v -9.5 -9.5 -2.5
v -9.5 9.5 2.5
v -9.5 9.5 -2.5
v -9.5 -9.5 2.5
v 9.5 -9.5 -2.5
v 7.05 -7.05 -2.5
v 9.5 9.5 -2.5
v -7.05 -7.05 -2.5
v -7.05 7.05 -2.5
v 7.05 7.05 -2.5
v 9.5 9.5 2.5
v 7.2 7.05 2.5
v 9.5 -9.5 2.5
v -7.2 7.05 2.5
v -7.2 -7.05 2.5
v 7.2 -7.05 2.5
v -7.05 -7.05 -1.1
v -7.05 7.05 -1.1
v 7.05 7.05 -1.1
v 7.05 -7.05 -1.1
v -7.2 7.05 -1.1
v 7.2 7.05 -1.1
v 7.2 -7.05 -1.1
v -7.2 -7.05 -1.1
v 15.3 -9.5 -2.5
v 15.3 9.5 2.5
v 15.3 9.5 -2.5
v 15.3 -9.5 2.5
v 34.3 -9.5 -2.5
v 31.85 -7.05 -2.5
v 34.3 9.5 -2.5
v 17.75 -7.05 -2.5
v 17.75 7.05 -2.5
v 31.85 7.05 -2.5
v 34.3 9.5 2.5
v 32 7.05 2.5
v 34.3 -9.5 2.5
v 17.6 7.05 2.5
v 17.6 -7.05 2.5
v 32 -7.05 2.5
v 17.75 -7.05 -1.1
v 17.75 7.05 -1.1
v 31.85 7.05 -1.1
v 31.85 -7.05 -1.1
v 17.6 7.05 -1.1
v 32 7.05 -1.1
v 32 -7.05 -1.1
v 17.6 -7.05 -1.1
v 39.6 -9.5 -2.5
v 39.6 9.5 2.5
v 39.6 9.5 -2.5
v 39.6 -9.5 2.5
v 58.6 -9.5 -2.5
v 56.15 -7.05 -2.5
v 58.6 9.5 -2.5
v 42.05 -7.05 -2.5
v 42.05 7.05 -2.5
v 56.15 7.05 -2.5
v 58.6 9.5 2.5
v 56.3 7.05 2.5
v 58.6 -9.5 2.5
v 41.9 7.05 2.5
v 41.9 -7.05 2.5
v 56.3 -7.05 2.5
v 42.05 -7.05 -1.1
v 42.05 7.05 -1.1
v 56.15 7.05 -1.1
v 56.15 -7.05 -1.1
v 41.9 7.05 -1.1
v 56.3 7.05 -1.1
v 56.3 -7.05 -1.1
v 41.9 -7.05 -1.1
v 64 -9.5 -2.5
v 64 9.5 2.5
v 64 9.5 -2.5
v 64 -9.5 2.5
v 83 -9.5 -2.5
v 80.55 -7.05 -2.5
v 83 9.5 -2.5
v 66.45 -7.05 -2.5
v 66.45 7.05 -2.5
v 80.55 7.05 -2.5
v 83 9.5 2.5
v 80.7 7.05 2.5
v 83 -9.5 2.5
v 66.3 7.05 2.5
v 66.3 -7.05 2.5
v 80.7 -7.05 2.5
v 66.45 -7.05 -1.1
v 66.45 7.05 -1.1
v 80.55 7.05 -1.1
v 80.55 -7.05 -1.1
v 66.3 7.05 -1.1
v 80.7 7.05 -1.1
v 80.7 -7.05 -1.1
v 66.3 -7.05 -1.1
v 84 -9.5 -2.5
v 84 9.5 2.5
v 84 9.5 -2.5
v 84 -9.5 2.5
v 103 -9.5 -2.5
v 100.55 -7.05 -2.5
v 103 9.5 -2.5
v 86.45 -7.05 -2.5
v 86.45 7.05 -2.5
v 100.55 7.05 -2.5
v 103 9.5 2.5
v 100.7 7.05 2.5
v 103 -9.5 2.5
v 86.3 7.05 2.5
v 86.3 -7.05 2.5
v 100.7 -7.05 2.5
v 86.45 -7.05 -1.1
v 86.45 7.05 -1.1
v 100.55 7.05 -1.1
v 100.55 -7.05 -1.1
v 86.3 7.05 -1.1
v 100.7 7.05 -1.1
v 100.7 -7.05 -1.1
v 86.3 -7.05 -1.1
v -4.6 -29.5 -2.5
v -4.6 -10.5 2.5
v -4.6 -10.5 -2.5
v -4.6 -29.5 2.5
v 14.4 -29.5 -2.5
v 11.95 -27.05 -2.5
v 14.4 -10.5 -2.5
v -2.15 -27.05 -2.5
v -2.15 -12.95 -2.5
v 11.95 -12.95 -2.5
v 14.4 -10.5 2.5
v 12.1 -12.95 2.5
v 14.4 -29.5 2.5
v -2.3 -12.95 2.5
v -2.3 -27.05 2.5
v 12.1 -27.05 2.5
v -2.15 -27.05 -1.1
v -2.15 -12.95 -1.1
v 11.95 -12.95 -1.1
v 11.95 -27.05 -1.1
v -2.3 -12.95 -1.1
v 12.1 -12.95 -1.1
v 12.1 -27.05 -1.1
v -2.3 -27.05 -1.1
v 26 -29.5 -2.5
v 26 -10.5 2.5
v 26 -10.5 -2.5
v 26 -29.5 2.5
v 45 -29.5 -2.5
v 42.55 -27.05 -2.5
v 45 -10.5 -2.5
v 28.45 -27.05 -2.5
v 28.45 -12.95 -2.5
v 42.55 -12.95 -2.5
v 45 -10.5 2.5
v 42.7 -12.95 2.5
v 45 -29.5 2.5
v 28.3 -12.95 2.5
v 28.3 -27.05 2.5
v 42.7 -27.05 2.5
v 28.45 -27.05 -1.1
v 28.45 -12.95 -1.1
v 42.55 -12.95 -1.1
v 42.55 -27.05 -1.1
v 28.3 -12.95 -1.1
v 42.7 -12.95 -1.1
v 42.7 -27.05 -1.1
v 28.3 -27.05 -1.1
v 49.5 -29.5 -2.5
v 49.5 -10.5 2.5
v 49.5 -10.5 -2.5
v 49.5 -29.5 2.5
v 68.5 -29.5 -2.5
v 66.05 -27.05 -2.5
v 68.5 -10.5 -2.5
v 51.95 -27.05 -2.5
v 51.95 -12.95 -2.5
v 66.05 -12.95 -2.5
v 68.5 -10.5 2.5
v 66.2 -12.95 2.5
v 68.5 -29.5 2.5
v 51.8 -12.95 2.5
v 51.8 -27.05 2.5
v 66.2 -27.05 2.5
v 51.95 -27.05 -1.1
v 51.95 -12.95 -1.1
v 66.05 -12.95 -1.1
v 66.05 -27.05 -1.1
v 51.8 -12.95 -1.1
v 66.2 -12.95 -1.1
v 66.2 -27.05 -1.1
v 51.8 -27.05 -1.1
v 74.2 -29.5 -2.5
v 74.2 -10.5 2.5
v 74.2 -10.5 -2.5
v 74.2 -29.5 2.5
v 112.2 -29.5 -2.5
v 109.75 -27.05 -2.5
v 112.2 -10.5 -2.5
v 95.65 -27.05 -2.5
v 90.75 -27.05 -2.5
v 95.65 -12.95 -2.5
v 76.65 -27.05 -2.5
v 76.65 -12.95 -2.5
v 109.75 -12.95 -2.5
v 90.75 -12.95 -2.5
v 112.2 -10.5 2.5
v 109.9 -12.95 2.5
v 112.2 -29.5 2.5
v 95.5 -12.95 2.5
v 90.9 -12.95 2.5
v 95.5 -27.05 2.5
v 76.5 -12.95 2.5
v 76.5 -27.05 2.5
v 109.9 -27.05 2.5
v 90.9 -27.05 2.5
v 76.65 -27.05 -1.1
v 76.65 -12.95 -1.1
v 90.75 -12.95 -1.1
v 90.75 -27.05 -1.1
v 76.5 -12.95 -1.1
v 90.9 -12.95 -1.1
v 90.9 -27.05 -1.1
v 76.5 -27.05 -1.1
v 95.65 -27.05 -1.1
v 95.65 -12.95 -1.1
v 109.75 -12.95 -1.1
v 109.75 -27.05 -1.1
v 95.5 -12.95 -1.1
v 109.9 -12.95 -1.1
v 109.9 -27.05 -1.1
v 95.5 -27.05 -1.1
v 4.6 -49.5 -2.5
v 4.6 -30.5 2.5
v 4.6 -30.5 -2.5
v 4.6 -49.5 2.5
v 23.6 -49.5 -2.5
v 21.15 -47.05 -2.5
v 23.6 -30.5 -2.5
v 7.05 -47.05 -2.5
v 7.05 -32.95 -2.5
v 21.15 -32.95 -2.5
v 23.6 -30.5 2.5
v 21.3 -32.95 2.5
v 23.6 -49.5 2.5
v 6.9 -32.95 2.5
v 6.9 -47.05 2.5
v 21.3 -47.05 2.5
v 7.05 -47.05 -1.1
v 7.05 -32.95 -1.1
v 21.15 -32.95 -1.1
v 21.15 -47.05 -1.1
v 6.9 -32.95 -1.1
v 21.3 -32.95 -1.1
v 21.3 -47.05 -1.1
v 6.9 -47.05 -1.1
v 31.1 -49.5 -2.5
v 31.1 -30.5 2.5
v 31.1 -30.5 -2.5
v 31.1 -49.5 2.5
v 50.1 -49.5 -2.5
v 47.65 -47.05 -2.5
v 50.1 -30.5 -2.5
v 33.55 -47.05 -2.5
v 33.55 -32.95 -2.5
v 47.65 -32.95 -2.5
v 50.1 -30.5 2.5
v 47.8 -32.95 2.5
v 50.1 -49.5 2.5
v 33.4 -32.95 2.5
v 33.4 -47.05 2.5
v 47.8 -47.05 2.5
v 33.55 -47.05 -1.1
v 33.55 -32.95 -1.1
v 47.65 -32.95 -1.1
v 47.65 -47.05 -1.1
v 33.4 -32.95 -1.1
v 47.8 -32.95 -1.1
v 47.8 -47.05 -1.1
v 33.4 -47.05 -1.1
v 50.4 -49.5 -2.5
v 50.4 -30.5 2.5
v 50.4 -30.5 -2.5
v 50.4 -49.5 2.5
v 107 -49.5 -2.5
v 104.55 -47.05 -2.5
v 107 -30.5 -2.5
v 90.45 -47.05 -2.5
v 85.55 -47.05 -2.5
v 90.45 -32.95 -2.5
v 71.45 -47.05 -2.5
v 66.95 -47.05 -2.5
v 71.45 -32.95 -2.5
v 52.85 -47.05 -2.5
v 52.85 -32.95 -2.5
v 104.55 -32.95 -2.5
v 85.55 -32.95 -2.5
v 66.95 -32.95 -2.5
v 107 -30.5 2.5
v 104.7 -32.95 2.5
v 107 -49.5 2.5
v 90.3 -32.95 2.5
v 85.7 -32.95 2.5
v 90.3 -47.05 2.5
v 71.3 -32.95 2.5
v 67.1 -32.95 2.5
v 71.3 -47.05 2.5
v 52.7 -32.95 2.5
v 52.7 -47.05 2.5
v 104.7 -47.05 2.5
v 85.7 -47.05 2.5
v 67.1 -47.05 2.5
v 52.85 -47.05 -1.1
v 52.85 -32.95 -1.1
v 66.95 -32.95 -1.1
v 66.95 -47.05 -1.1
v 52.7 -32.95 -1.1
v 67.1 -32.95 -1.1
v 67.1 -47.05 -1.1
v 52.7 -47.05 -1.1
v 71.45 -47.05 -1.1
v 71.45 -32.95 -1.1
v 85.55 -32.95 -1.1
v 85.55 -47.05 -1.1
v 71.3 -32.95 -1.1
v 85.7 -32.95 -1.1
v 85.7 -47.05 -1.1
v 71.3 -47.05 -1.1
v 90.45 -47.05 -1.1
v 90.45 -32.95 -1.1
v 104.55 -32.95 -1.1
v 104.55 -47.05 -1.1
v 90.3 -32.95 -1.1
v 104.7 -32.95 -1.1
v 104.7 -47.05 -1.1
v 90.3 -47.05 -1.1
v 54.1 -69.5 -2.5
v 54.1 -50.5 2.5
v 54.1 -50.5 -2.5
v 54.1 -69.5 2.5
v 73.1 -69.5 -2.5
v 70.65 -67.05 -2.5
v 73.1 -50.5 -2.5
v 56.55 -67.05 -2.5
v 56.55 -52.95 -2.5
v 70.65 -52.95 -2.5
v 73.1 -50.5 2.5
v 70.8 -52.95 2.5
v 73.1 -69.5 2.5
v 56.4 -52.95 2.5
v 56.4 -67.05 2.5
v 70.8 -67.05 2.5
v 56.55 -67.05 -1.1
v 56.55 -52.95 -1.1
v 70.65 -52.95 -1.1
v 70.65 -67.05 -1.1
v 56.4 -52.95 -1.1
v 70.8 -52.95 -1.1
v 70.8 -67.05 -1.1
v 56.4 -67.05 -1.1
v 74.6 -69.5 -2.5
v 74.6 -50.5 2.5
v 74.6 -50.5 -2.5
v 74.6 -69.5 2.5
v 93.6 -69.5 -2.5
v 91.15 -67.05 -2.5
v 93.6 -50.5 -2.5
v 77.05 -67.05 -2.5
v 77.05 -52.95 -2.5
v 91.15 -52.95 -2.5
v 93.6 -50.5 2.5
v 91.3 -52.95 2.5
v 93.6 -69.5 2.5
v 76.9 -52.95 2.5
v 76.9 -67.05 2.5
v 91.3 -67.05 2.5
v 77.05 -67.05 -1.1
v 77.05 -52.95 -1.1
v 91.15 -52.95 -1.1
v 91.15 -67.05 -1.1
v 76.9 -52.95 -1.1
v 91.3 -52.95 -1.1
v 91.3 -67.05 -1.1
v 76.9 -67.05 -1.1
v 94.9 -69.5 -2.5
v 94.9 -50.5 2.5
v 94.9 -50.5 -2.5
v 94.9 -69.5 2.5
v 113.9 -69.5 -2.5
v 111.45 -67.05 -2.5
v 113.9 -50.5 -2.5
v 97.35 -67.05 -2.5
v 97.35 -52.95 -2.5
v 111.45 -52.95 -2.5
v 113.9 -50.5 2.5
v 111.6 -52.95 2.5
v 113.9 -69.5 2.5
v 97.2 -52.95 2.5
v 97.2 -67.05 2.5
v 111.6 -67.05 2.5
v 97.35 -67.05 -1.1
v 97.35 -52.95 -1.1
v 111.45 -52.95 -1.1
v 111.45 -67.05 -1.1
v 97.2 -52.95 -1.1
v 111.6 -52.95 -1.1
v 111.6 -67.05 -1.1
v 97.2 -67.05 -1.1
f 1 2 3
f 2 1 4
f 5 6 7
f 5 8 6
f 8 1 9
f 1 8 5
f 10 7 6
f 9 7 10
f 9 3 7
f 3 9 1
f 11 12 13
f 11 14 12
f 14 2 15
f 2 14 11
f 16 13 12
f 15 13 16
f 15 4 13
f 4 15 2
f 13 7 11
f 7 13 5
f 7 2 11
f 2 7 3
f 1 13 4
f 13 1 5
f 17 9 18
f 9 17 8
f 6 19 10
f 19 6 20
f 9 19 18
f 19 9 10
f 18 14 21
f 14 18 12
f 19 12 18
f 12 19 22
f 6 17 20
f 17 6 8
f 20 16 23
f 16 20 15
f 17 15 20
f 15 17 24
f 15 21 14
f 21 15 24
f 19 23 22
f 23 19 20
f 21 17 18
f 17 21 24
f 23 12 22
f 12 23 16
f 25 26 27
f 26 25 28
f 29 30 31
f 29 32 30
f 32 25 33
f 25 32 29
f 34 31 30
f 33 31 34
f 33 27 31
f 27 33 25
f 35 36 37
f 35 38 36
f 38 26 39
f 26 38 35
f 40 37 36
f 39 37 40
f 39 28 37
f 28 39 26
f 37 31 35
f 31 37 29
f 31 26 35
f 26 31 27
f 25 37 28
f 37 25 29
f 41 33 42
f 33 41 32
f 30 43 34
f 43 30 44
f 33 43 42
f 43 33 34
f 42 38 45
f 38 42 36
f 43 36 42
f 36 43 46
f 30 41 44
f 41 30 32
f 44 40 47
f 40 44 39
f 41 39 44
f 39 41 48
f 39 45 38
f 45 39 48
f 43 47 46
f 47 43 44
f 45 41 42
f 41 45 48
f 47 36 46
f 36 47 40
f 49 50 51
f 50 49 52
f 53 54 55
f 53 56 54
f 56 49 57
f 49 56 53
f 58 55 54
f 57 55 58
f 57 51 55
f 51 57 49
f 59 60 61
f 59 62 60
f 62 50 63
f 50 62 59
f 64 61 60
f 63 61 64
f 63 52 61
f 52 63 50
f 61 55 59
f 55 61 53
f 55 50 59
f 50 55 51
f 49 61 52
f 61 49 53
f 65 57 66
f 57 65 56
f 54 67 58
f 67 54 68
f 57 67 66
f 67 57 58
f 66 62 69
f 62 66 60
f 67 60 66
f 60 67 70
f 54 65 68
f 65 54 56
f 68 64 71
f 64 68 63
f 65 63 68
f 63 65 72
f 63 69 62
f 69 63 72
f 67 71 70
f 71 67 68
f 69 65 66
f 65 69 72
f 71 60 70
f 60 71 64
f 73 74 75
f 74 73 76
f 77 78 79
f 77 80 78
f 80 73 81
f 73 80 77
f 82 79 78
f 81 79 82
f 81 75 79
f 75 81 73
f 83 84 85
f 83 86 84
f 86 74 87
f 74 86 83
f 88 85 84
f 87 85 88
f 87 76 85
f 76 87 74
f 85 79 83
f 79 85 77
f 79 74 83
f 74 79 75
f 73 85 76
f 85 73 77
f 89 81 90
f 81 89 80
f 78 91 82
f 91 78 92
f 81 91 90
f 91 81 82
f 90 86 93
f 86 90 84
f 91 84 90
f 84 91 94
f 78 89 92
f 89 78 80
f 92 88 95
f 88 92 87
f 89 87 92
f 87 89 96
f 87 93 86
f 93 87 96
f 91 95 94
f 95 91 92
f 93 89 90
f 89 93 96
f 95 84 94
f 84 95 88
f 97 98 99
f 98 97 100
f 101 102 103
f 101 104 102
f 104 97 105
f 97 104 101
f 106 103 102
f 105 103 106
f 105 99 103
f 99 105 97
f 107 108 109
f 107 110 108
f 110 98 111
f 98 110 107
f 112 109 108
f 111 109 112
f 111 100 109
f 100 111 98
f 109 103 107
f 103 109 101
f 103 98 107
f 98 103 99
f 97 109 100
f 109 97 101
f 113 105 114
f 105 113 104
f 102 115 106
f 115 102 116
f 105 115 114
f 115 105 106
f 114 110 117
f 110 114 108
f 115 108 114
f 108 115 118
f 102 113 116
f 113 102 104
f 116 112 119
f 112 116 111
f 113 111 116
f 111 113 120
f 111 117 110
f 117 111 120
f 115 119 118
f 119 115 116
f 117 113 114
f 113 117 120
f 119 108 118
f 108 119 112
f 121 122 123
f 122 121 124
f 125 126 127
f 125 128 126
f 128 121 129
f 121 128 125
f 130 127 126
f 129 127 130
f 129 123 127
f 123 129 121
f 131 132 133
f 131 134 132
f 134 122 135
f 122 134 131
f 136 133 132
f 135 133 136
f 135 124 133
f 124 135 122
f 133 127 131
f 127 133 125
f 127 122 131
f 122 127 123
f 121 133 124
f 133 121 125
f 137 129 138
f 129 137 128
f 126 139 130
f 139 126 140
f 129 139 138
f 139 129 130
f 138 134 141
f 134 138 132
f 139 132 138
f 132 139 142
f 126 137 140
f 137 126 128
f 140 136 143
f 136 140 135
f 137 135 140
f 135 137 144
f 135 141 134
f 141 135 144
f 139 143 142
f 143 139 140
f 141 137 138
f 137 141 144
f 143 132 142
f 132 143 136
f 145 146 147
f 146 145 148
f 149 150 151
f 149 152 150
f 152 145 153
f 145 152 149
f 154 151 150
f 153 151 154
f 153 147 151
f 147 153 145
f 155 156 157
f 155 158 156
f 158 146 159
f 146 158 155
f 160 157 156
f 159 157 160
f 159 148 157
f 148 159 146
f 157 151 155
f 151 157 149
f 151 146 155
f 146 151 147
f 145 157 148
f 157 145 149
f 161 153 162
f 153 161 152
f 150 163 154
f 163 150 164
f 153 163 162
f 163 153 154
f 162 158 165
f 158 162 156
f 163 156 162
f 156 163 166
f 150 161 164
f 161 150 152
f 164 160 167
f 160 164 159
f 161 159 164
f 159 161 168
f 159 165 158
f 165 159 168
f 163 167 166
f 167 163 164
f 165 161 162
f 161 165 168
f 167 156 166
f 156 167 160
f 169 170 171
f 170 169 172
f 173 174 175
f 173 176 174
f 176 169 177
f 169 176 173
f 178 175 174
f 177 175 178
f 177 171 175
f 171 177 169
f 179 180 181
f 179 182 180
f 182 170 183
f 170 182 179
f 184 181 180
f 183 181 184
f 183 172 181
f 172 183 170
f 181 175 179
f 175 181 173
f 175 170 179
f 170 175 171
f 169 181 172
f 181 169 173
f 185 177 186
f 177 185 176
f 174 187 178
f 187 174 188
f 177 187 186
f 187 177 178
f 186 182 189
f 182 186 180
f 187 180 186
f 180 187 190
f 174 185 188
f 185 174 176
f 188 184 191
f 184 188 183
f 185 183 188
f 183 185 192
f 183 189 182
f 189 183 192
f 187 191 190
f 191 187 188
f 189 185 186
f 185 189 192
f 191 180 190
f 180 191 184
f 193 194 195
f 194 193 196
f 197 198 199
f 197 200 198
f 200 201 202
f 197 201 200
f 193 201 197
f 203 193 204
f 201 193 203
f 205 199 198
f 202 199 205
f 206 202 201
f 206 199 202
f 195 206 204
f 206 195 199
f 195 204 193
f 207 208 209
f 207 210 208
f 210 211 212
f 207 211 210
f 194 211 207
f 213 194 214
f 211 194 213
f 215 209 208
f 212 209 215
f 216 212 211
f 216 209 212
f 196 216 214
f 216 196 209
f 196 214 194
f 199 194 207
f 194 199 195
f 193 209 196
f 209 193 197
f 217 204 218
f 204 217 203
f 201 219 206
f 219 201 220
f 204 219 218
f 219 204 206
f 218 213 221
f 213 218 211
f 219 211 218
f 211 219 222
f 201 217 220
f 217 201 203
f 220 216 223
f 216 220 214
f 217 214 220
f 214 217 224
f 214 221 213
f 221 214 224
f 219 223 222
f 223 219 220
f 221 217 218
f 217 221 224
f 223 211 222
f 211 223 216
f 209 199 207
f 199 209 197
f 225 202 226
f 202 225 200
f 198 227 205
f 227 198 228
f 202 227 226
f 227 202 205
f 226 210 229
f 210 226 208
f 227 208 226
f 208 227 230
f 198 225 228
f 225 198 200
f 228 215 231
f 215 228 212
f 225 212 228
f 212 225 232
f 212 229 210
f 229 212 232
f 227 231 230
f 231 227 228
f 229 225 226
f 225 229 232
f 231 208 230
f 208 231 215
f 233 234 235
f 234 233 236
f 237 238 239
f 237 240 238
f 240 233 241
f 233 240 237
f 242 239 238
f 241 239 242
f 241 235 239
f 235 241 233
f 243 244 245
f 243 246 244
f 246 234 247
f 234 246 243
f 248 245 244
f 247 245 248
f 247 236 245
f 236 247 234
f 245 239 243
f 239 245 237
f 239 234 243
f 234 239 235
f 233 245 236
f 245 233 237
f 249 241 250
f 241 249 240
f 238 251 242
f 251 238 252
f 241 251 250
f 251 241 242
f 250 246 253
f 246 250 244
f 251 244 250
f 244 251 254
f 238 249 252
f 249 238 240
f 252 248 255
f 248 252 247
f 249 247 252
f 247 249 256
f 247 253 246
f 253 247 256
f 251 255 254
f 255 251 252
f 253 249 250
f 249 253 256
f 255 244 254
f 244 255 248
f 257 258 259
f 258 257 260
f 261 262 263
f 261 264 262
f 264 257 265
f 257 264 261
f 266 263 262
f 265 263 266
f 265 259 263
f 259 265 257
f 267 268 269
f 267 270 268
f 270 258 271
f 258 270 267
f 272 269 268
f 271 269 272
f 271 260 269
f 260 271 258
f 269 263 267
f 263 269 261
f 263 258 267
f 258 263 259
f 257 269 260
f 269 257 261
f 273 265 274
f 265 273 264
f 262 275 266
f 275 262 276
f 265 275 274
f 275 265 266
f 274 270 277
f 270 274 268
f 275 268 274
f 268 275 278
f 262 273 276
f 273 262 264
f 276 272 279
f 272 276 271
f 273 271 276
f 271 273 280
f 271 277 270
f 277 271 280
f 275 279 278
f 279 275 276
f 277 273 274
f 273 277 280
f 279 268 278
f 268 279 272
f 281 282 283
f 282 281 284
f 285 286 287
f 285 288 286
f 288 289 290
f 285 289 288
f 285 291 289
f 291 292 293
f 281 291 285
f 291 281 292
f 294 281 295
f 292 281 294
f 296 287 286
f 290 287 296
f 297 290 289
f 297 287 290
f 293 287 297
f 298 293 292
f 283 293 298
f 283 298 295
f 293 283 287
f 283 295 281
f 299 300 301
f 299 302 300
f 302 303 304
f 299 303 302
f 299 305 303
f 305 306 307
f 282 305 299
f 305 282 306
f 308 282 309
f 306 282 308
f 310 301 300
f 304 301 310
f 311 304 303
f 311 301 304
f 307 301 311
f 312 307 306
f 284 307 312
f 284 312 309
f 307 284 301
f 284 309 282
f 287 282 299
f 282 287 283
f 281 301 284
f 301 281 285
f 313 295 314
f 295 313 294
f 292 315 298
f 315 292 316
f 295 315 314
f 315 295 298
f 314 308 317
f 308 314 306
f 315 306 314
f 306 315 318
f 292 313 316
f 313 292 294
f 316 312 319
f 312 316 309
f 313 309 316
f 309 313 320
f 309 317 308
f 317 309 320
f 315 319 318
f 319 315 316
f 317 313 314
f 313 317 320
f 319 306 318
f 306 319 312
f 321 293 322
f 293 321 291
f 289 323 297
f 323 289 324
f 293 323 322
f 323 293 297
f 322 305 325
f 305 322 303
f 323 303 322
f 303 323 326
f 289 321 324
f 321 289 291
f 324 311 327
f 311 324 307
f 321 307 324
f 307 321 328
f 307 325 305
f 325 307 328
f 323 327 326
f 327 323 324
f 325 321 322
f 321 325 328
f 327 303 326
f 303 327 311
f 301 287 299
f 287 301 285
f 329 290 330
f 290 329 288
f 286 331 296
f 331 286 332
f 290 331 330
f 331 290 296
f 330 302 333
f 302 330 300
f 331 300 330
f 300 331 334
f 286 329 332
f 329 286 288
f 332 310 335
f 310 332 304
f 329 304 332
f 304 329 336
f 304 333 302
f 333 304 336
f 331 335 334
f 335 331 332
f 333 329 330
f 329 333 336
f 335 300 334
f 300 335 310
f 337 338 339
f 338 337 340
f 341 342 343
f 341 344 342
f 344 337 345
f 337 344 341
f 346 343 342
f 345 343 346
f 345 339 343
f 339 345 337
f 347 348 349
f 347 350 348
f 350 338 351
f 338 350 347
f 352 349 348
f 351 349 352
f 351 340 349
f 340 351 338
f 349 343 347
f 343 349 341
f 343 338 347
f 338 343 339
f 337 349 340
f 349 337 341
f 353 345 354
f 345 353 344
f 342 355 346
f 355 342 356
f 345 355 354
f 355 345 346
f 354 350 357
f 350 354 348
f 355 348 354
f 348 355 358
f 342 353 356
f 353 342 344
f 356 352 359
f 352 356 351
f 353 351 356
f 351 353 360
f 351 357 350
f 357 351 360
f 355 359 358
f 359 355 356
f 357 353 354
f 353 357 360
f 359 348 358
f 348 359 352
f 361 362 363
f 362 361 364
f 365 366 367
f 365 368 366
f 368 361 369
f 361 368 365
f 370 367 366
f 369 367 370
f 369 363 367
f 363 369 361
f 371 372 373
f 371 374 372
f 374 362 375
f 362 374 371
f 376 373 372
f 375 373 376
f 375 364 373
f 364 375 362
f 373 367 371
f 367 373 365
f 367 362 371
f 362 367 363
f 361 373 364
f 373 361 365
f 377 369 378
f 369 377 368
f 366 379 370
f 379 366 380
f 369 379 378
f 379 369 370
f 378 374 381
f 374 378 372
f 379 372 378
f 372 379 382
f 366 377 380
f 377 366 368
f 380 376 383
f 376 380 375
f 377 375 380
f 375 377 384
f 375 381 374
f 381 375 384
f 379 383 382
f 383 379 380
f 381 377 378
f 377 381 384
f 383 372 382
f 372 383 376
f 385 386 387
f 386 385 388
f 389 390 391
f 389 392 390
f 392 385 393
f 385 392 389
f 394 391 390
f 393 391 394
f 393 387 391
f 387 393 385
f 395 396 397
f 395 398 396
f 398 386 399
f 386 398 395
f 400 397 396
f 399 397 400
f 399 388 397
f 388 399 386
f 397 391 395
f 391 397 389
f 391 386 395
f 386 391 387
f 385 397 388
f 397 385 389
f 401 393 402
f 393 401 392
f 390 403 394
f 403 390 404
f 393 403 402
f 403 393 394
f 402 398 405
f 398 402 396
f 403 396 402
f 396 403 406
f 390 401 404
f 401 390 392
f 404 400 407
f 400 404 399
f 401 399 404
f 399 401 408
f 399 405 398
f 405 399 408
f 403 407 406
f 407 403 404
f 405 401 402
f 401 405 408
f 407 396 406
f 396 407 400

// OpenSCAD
/*
##### Vial
Copy Vial Firmware vial.uf2 to PR2040
Config met vial configurator https://vial.rocks/

#### common layout
Left thumb Ctrl Alt Shift
Right thumb Enter Space Tab(?)
lower prio ,./ 


#### Special tricks
double press two keybords e.g. 
	momentary layer double thumb pres
	single shot layer double thumb pres

Special keys
print screen
Tab	
Del Left Thumb cluster with Backspace subst ;
Backspace -> subst ;

### Ctrl
Ctrl+c
Ctrl+x
Ctrl+v

Solution
tabdance
momentary layer
NO Double Thumb one hand on mouse no double press action two keybaords

### Navigation/quick edit
Del Left Thumb cluster with Backspace subst ;
Arrows
Pgup
PgDn
home 
end
copy 
cut 
paste
Select extend Ctrl+Shift+Arrows
Select end of line

Solution


Windows management
Move window screen Win+shift+Left-Right Default
max window Ctrl+Alt+Up AHK
min window
close window

#### Ctrl+Alt
Quick launch

Ctrl+Alt+Q-P 

Solution
Ctrl-Alt-Shift left -> thunb conbo
tabdance to stick Ctrl+Al

### Layers
Order of importance so easy to use

## 1 Fast edit Left thumb
# right pad
Arrows 
Page up down
_ underscore 

# left pad
cut a
copy f
paste d


## 2 Num thumb double tab hold

## 3 Function

## 4 shortcuts launches on shot 
CTRL ALT #




























##### hardware soldering
https://scottokeebs.com/blogs/keyboards/scottoergo-handwired-keyboard

	1  "GP0"        40
	2  "GP1"        39
	3               38
	4  "GP2"        37
	5  "GP3"        36
	6  "GP4"        35
	7               34
	8               33
	9               32
	10              31
	11              30
	12              29"GP22"
	13              28
	14              27"GP21"
	15              26"GP20"
	16 "GP12"r      25"GP19"
	17 "GP13"r      24"GP18"
	18              23 
	19 "GP14"r      22
	20 "GP15"r      21

constFilePath=C:\user\job\data\setting\openscad\easy_dactyl\easyDactyl.scad
Autohotkey plugin
strOffset=2
*/

/*
https://openscad.org/cheatsheet/
Todo

Make thumb cluster

thumb inner down
Thum mid slightly out
Thum outer slightly in

clamp bottom top
connect top rows

*/
$fn=64;
hook_w = 3.5;
hook_t = 1.5;
hook_h = 10;

beak_l = 1; // overhang
beak_h = 2;
beak_w = hook_w;

stem_b = hook_w; // overhang
stem_h = hook_h;
stem_t = hook_t;

/*
12 pins
battery=3
*/
draad_dia=2;

//pro micro controler
pm_pin_w = 15.24;
pm_w = 18;
pm_l = 33;
pm_h = 3.2; //solder included
//pm_l = 9;

pin_dist=2.54;
//Header Sandwitch
hs_plate_h = 6;
hs_plate_w = pm_w+6;
hs_plate_l = pm_l;
hs_shift_back=hs_plate_l/2;
// hs_shift_lower=(hs_plate_h/2);
hs_shift_lower=3;
// Reinforcement strips on top of the sides
//reinforcement_strip_h=2;
dropSideWireHole=1.5; // height to to center wire pierce
// cut top and bottom
cutPlate_w = 30;
cutPlate_l = 40;
cutPlate_h = 20;
// battery compartment
//bc_h = hs_plate_h+4;
//bc_w = hs_plate_w-11;
bc_l = hs_plate_l+2;
bed_h                 = 1;
bc_h                  = 3.5;
//bc_h                  = 7;
bc_w                  = 13;
pin_supp_h            = 1.5;
reinforcement_strip_h = 2 ;

//#hs_top();
module hs_top()
{
    difference()
    {
        header_body();
        translate([0, 0, bed_h + bc_h + -(cutPlate_h/2)]){cube([cutPlate_l, cutPlate_w, cutPlate_h], true);}
    }
}

//hs_bottom();
module hs_bottom()
{

// Hooks
/*
    #translate([5.2, -(hook_t/2)-(hs_plate_w/2), hook_h/2])rotate([0, 0, 90]){hook();}
    #translate([5.2, (hook_t/2)+(hs_plate_w/2), hook_h/2])rotate([0, 0, -90]){hook();}
    #translate([-14.75, -(hook_t/2)-(hs_plate_w/2), hook_h/2])rotate([0, 0, 90]){hook();}
    #translate([-14.75, (hook_t/2)+(hs_plate_w/2), hook_h/2])rotate([0, 0, -90]){hook();}
*/

    //stopper corner plates
    // sp_t = 1.2;
    // sp_w = (hs_plate_w-bc_w)/2;
    // sp_h = 6;
    // translate([-sp_t/2-hs_plate_l/2,   hs_plate_w/2-sp_w/2 , sp_h/2]){cube([sp_t, sp_w, sp_h], true);}
    // translate([-sp_t/2-hs_plate_l/2, -(hs_plate_w/2-sp_w/2), sp_h/2]){cube([sp_t, sp_w, sp_h], true);}
    // translate([ sp_t/2+hs_plate_l/2, -(hs_plate_w/2-sp_w/2), sp_h/2]){cube([sp_t, sp_w, sp_h], true);}
    // translate([ sp_t/2+hs_plate_l/2,   hs_plate_w/2-sp_w/2 , sp_h/2]){cube([sp_t, sp_w, sp_h], true);}

    difference()
    {
        header_body();
        translate([0, 0, bed_h + bc_h + (cutPlate_h/2)]){cube([cutPlate_l, cutPlate_w, cutPlate_h], true);}
    }
}

//Hood
hood_t = 1.8;
hood_h = hood_t + bed_h + bc_h + pin_supp_h + reinforcement_strip_h+ pm_h;
hood_w = hs_plate_w + hood_t*2;
hood_l = hs_plate_l;
//hs_plate_h = bed_h + bc_h + pin_supp_h + reinforcement_strip_h;
beak_bottom_l = 6;
beak_bottom_w = hs_plate_l;
beak_bottom_h = 1.8;
beak_bottom_angle = 25;

// rotate([180, 90, 0]){hood();}
module hood()
{
    difference()
    {
        hood_raw();
        translate([0, 0, (hood_h / 2)                                          ]){cube([hood_l, hood_w - hood_t*2, hood_h - hood_t -1], true);} // inner hood removeal
        sideCableOpeningPierce();
        translate([0, 0, -2+(hood_h / 2)                                          ]){cube([hood_l, -4+hood_w - hood_t*2, hood_h -hood_t], true);} // inner hood removeal
    }
}

module hood_raw()
{
    translate([0, 0, (hood_h / 2)                                          ]){cube([hood_l, hood_w, hood_h], true);}
    hoodBottomBeak();
}

module hoodBottomBeak() //clamp bottom hood
{
    translate([0, -hood_w/2, -beak_bottom_h]){rotate([180, 0, 90]){hook_head(beak_bottom_l, beak_bottom_w, beak_bottom_h, beak_bottom_angle);}}
    translate([0, hood_w/2, -beak_bottom_h]){rotate([180, 0, -90]){hook_head(beak_bottom_l, beak_bottom_w, beak_bottom_h, beak_bottom_angle);}}
}

module sideCableOpeningPierce() //opening all cable outlet
{
    hood_cable_opening_h = beak_bottom_h+bed_h + bc_h + pin_supp_h + reinforcement_strip_h;
    hood_cable_opening_w = 10;
    hood_cable_opening_l = 14;
    moveToSide=(-hood_w/2)-(hood_cable_opening_w/2) + hood_t+2;
    moveToOverCable = -5;
    translate([moveToOverCable, moveToSide, -beak_bottom_h + hood_cable_opening_h/2]){cube([hood_cable_opening_l, hood_cable_opening_w, hood_cable_opening_h], true);}
}

// header_body();
module header_body()
{
    hs_plate_h = bed_h + bc_h + pin_supp_h + reinforcement_strip_h;

    difference()
    {
        translate([0, 0, hs_plate_h / 2                                         ]){cube([hs_plate_l, hs_plate_w, hs_plate_h], true);}
        translate([0, 0, (reinforcement_strip_h / 2) + bed_h + pin_supp_h + bc_h]){cube([hs_plate_l+1, pm_w, reinforcement_strip_h], true);}
        translate([0, 0, (bc_h/2) + bed_h                                       ]){cube([bc_l, bc_w, bc_h], true);}
        holes_top_pierce = 5; //size cube heigth pushing square holes top
        translate([-5, 0, bc_h + bed_h + holes_top_pierce/2                    ]){cube([17, bc_w, holes_top_pierce], true);}
        translate([12, 0, bc_h + bed_h + holes_top_pierce/2                     ]){cube([10, bc_w, holes_top_pierce], true);}
        StartOffset=14;
        translate([-StartOffset, 0, bed_h + bc_h]){
            translate([pin_dist*0 , 0, 0]){pin_pair(0, 0);}
            translate([pin_dist*1 , 0, 0]){pin_pair(0, 0);}
            translate([pin_dist*2 , 0, 0]){pin_pair(1, 1);}
            translate([pin_dist*3 , 0, 0]){pin_pair(1, 1);}
            translate([pin_dist*4 , 0, 0]){pin_pair(1, 1);}
            translate([pin_dist*5 , 0, 0]){pin_pair(1, 1);} // row 1
            translate([pin_dist*6 , 0, 0]){pin_pair(0, 1);} //        col 1
            translate([pin_dist*7 , 0, 0]){pin_pair(0, 0);}
            translate([pin_dist*8 , 0, 0]){pin_pair(0, 0);}
            translate([pin_dist*9 , 0, 0]){pin_pair(0, 1);} // -
            translate([pin_dist*10, 0, 0]){pin_pair(0, 0);}
            translate([pin_dist*11, 0, 0]){pin_pair(0, 1);} // +
            // row side wire col pass through in between
            translate([pin_dist*6  + (pin_dist/2), 0, 0]){pin_side_row_pass();}
            translate([pin_dist*7  + (pin_dist/2), 0, 0]){pin_side_row_pass();}
            translate([pin_dist*8  + (pin_dist/2), 0, 0]){pin_side_row_pass();}
            translate([pin_dist*9  + (pin_dist/2), 0, 0]){pin_side_row_pass();}
            translate([pin_dist*10 + (pin_dist/2), 0, 0]){pin_side_row_pass();}
        }
        //ColWireCut();
    }
}

// wire cut transport hole row side wide opening replace by routing inbetween pins
module ColWireCut()
{
    wireHole=6;
    wireHolePierce=hs_plate_w/2;
    
    translate([-5, -12, 1]){rotate([90, 0, 0]){cylinder(wireHolePierce, wireHole/2, wireHole/2,true);}}
}

//Totaal
//translate([0, 0, 3]){header_sandwitch();}
module header_sandwitch()
{
    // reinforcement top row holes
    difference()
    {
        translate([hs_shift_back, 0, (hs_plate_h/2)+(reinforcement_strip_h/2)]){cube([hs_plate_l, hs_plate_w, reinforcement_strip_h], true);}
        translate([hs_shift_back, 0, (hs_plate_h/2)+(reinforcement_strip_h/2)]){cube([pm_l+0.5, pm_w+0.5, reinforcement_strip_h+0.5], true);}
    }

    difference()
    {
        //lower body

        translate([hs_shift_back, 0, 0]){cube([hs_plate_l, hs_plate_w, hs_plate_h], true);}
        //cube([hs_plate_l, hs_plate_w, hs_plate_h], true);
        StartOffset=1.5;
        fromTop=(hs_plate_h/2)-dropSideWireHole; // height to center wire pierce so will lower side wire hole descreases pier from mc

        translate([StartOffset, 0, fromTop]){
            translate([pin_dist*0 , 0, 0]){pin_pair(0, 0);}
            translate([pin_dist*1 , 0, 0]){pin_pair(0, 0);}
            translate([pin_dist*2 , 0, 0]){pin_pair(1, 1);}
            translate([pin_dist*3 , 0, 0]){pin_pair(1, 1);}
            translate([pin_dist*4 , 0, 0]){pin_pair(1, 1);}
            translate([pin_dist*5 , 0, 0]){pin_pair(1, 1);} // row 1
            translate([pin_dist*6 , 0, 0]){pin_pair(0, 1);} //        col 1
            translate([pin_dist*7 , 0, 0]){pin_pair(0, 0);}
            translate([pin_dist*8 , 0, 0]){pin_pair(0, 0);}
            translate([pin_dist*9 , 0, 0]){pin_pair(0, 1);} // -
            translate([pin_dist*10, 0, 0]){pin_pair(0, 0);}
            translate([pin_dist*11, 0, 0]){pin_pair(0, 1);} // +
        }

        // battery compartment
        translate([hs_shift_back, 0, hs_shift_lower]){cube([bc_l, bc_w, bc_h], true);}
    }
}

module pin_pair( wire_pierce_row, wire_pierce_col)
{
    pin_side_col(wire_pierce_col);
    pin_side_row(wire_pierce_row);
}

module pin_side_col(wire_pierce_col)
{
    translate([0, pm_pin_w/2, 0])
    {
        pin_pierce();
        if (wire_pierce_col)
            wire_pierce(10);
        else
            wire_pierce(1.8);
    }
}

module pin_side_row(wire_pierce_row)
{
    translate([0, -pm_pin_w/2, 0])
    {
        pin_pierce();
        if (wire_pierce_row)
            wire_pierce(10);
        else
            wire_pierce(1.8);
    }
}

module pin_side_row_pass()
{
    translate([0, -pm_pin_w/2, 0])
    {
        wire_pierce(10);
    }
}

module pin_pierce()
{
    //pin pierce
    pin_dia=1.2;
    pin_l=2.8*10;
    cylinder(pin_l, pin_dia/2, pin_dia/2,true);
}

module wire_pierce(w_pierce)
{
    //Wire pierce is length all the way through is 10 only use for easy pin through no clean up 3
    // w_pierce=10;
    rotate([90, 0, 0]){cylinder(w_pierce, draad_dia/2, draad_dia/2,true);}
}

/*
https://www.blocklayer.com/graph-papereng
Put key caps with gum for layout
puncture center of of caps 
measure Y and X in 
Raw grid for https://www.keyboard-layout-editor.com/#/

[{y:0.13,x:5},"R"],
[{y:-0.5,x:10.25},"U"],
[{y:-0.88,x:3.75},"E"],
[{y:-0.87,x:2.5},"W"],
[{y:-0.88,x:11.5},"I"],
[{y:-0.87,x:12.75},"O"],
[{y:-0.88,x:6.25},"T"],
[{y:-0.88,x:8.5},"Y"],
[{y:-0.87,x:1},"Q"],
[{y:-0.75,x:14},"P"],
[{y:-0.75,x:10.25},"J"],
[{y:-0.88,x:3.75},"D"],
[{y:-0.87,x:5},"F"],
[{y:-0.88,x:11.5},"K"],
[{y:-0.87,x:2.5},"S"],
[{y:-0.88,x:6.25},"G"],
[{y:-0.87,x:1.25},"A"],
[{y:-0.88,x:9},"H"],
[{y:-0.87,x:14},"Back\nShift"],
[{y:-0.74,x:10.25},"M"],
[{y:-0.89,x:3.75},"C"],
[{y:-0.75,x:11.5},"<\n,"],
[{y:-0.87,x:2.5},"X"],
[{y:-0.87,x:5},"V"],
[{y:-0.75,x:6.25},"B"],
[{y:-0.87,x:1.25},"Z",{x:10.5,a:7},"LT"],
[{y:-0.88,x:8.75,a:4},"N"],
[{y:-0.87,x:14},"?\n/"],
[{y:-0.38,x:3.75,a:7},"Ctrl"],
[{y:-0.99,x:10},"Space"],
[{y:-0.88,x:5.25},"Alt",{x:0.5},"Win"],
[{y:-0.87,x:11.5},"LT"],
[{y:-0.88,x:8.75},"Enter"],
[{ry:0.75,y:2,x:12.75,a:4},"LL"]

Should be the basis to continue with QMK Vial Keybord json

*/

//tempPrintTile();
//vertical travel no gaps check col row cluster space contine y offset

11T = [00.0, -00.0]; 12T = [24.8, -00.0]; 13T = [49.1, -00.0]; 14T = [73.5, -00.0]; 15T = [ 93.5, -00.0];
21T = [04.9, -20.0]; 22T = [35.5, -20.0]; 23T = [59.0, -20.0]; 24T = [83.7, -20.0]; 25T = [102.7, -20.0];
31T = [14.1, -40.0]; 32T = [40.6, -40.0]; 33T = [59.9, -40.0]; 34T = [78.5, -40.0]; 35T = [ 97.5, -40.0];
41T = [24.1, -60.0]; 42T = [45.6, -60.0]; 43T = [63.6, -60.0]; 44T = [84.1, -60.0]; 45T = [104.4, -60.0];

11R = 0; 12R = 0; 13R = 0; 14R = 0; 15R = 0;
21R = 0; 22R = 0; 23R = 0; 24R = 0; 25R = 0;
31R = 0; 32R = 0; 33R = 0; 34R = 0; 35R = 0;
41R = 0; 42R = 0; 43R = 0; 44R = 0; 45R = 0;

  moveTile(11T, 11R);moveTile(12T, 12R);  moveTile(13T, 13R);moveTile(14T, 14R);moveTile(15T, 15R);
  moveTile(21T, 21R);moveTile(22T, 22R);  moveTile(23T, 23R);moveTile(24T, 24R);moveTile(25T, 25R);
  moveTile(31T, 31R);moveTile(32T, 32R);  moveTile(33T, 33R);moveTile(34T, 34R);moveTile(35T, 35R);
/*moveTile(41T, 41R);moveTile(42T, 42R);*/moveTile(43T, 43R);moveTile(44T, 44R);moveTile(45T, 45R);

module moveTile(Txy, alpha) //move only xy and rotate around z
{
      translate([Txy[0], Txy[1], 0]){rotate([0, 0, alpha]){tile();}}
}

//tile();
module tempPrintTile()
{
	difference()
	{
		tile();
		translate([0, 0, -0.8])
		{
            cube([100, 100, 5],true);
		}
	}
}

//tile
module tile()
{
    rotate([0, 180, 0])
    {
        difference()
        {
            cube([sw_frame_b,sw_frame_b,sw_frame_h],true);
            cube([sw_l,sw_b, 5 + push_through],true);
            translate([0, 0, -click_ridge_h])
            {
                cube([sw_l+0.3,sw_b,5],true);
            }
        }
    }

	model_addHotSwap = false;
	if (model_addHotSwap)
	{
		//# hotswap house
		moveUp_hotSwap=4.3;
		moveLeft_hotSwap=2.5;
		translate([25.7-sw_frame_b, moveLeft_hotSwap, moveUp_hotSwap])
		{
			hotswap();
		}

		//# DraadKlem Diode
		// moveUp=draad_dia/2+1;
		moveUp=(sw_frame_h/2+(draad_klem_hoogte)/2);
		moveLeft=8.25;
		//movex=-sw_frame_b/2;
		movex=-6.17;
		translate([movex, moveLeft, moveUp])
		{
			draadKlem();
		}
		//#DraadKlem kolom
		// moveUp=draad_dia/2+1;
		moveUp_DraadKlem=(sw_frame_h/2+(draad_klem_hoogte)/2);
		movey__DraadKlemKolom=3.3;
		//movex=-sw_frame_b/2;
		movex_DraadKlemKolom=sw_frame_l/2-frame_dikte/2;
		translate([movex_DraadKlemKolom, -movey__DraadKlemKolom, moveUp_DraadKlem])
		{
			rotate([0, 0, 90])
			{
				draadKlem();
			}
		}
	}
}


//##### Main
/*
WIP Macro translate 
translate([10,0,0]){rotate([0, 0, 0]){thumbCluster();}}
*/

//main_easyDactyl();

module main_easyDactyl()
{
    support();
	//translate([-40, -19, 0]){rotate([0, 0, 0]){thumbCluster();}}
    translate([-41, -34, 0]){rotate([0, 0, -3]){thumbCluster();}}
    col_five();
}

module support()
{
    // upper connection support
    translate([19, 31, 0])      {rotate([0, 0, -45]){cube([frame_dikte+9, frame_dikte, sw_frame_h], true);}}
    // thumb connection support
    translate([ -43.3, -23, 0])  {rotate([0, 0, -90]){cube([frame_dikte+2, frame_dikte, sw_frame_h], true);}}
}

//### thumbCluster()
module thumbCluster()
{
    thumb_inner_rotation=0;
    translate([4.90,20.10,0])   {rotate([0, 0, -thumb_inner_rotation]){tile();}}
    thumb_mid_rotation=10;
    translate([2,0,0]) {rotate([0, 0, -thumb_mid_rotation]){tile();}}
    thumb_center_rotation=15;
    translate([-4, -19, 0])   {rotate([0, 0, -thumb_center_rotation]){tile();}}
}

module col_five()
{
    pinky_drop=7;
    pinky_rotation=7;
    translate([ -pinky_drop, 2*sw_frame_b+2.5, 0]) {rotate([0, 0, pinky_rotation]){tileTripple();}}
    translate([  1         ,    sw_frame_b   , 0]) {tileTripple();}
    translate([  7         ,             0   , 0]) {tileTripple();}
    translate([  3         ,   -sw_frame_b   , 0]) {tileTripple();}
    translate([  0         , -2*sw_frame_b   , 0]) {tileTripple();}
}

//### Finger Col
//tileTripple();
module tileTripple()
{
    // well_curve      =10;
    // well_curve_lift =1.70;
    // Well_curve_gap  =0.2; //after curve gap will grow

    well_curve     =0;
    well_curve_lift=0;
    Well_curve_gap =0;

    translate([-(sw_frame_b + Well_curve_gap), 0, well_curve_lift]){rotate([0, well_curve,0]){tile();}}
    tile();
    translate([ sw_frame_b + Well_curve_gap, 0, well_curve_lift]){rotate([0,-well_curve,0]){tile();}}
}

//staggerRow();
module staggerRow()
{

    translate([ -sw_frame_b, sw_frame_b/2, 0]){tileRow();}
    translate([ 0,          0, 0]){tileRow();}
    translate([ sw_frame_b, -sw_frame_b/4, 0]){tileRow();}
}

//tileRow();
module tileRow()
{
    translate([ 0, -sw_frame_b * 2, 0]){tile();}
    translate([ 0, -sw_frame_b, 0]){tile();}
    tile();
    translate([ 0, sw_frame_b, 0]){tile();}
    translate([ 0, sw_frame_b * 2, 0]){tile();}
}

push_through = 2;
add_mm = 1;
 // keycap
kc_l = 18;
kc_b = 18;
kc_space = 1;
// switch
// sw_l = 13.9;
// sw_b = 13.9;
sw_l = 14.1;
sw_b = 14.1;
sw_frame_h = 5; 
sw_frame_l = kc_l + kc_space;
sw_frame_b = kc_b + kc_space;
sw_frame_side_thickness = 1.5;
sw_frame_side_top = 1.5;
click_ridge_h = 1.4;
frame_dikte = (sw_frame_l-sw_l)/2;

//::################## draadKlem                   ##################
diode_dia=0.8;
draad_klem_lengte=2.5; //y richting lengte waarover de draad vast zit
// draad_klem_hoogte= sw_frame_h+draad_dia+1; // hoogte van de sw_houder+draad_dia+1mm
draad_klem_hoogte= draad_dia+1; // hoogte van de sw_houder+draad_dia+1mm
draad_klem_breedte=(draad_dia/1.5)+draad_dia+(draad_dia/1.5)+2;


pin_h=3.6;

// draadKlemHuis();
// draadGat();
// draadSpleet();
// draadKlemHuis(); //y richting draad

// draadNaaldGat();

//draadCutOut();
// draadKlem();
module draadKlem()
{
    difference()
    {
        draadKlemHuis(draad_klem_breedte, frame_dikte, draad_klem_hoogte);
        //draadCutOut();
        translate([0, 0, -0.5])
        {
            draadCutOut();
        }
    }
}
//draadKlemHuis(draad_klem_breedte, frame_dikte, draad_klem_hoogte);
module draadKlemHuis(breedte, lengte, hoogte)
{
    cube([breedte, lengte, hoogte], true);
}

//draadCutOut();
module draadCutOut()
{
    draadGat();
    draadSpleet();
    //draadNaaldGat();
}

module draadGat()
{
    rotate([90,0,0])
    {
      cylinder(draad_klem_lengte+push_through, draad_dia/2, draad_dia/2,true);

    }
}

module draadNaaldGat()
{
    rotate([0,90,0])
    {
      cylinder(20, diode_dia, diode_dia,true);

    }
}

module draadSpleet()
{
    translate([0, 0, (draad_klem_hoogte/4)+1])
    cube([draad_dia/1.5, draad_klem_lengte+push_through, draad_dia+2], true);
}

//hotswap();
module hotswap()
{
    pin_dia=1.8;
    diode_dia_hotplug=1.5;
    hotswop_choke=0.2;
    //hotswop_choke=0.3; //3 look ok might try 2
    difference()
    {
        cube([5.6, 5, pin_h], true);
        translate([-1.2,0,0])
        {
            cylinder(10, pin_dia/2, pin_dia/2, true); //switch pin
            translate([0,hotswop_choke,0])
            {
                rotate([0,90,0])
                {
                    cylinder(10, diode_dia_hotplug/2, diode_dia_hotplug/2,true);
                }
            }
        }
    }
}

//hook();
module hook() //obsolete
{
cube([stem_t, stem_b, stem_h], true);
translate([hook_t/2, 0, hook_h/2]){hook_head();}
}

//translate([hook_t/2, 0, hook_h/2]){hook_head();}
module hook_head(beak_l, beak_w, beak_h, beak_angle)
{
    difference()
    {
        translate([beak_l/2,0,-beak_h/2])
        {
            cube([beak_l, beak_w, beak_h], true);
        }
        slant_cube_l = beak_l + 4;
        slant_cube_h = beak_h * 2;
        slant_cube_w = beak_w + 5;
        slant_cub_angle = beak_angle;

        rotate([0, slant_cub_angle, 0])
        {
            translate([slant_cube_w/2, 0, slant_cube_h/2])
            {
                cube([slant_cube_w, slant_cube_w, slant_cube_h], true);
            }
        }
    }
}
